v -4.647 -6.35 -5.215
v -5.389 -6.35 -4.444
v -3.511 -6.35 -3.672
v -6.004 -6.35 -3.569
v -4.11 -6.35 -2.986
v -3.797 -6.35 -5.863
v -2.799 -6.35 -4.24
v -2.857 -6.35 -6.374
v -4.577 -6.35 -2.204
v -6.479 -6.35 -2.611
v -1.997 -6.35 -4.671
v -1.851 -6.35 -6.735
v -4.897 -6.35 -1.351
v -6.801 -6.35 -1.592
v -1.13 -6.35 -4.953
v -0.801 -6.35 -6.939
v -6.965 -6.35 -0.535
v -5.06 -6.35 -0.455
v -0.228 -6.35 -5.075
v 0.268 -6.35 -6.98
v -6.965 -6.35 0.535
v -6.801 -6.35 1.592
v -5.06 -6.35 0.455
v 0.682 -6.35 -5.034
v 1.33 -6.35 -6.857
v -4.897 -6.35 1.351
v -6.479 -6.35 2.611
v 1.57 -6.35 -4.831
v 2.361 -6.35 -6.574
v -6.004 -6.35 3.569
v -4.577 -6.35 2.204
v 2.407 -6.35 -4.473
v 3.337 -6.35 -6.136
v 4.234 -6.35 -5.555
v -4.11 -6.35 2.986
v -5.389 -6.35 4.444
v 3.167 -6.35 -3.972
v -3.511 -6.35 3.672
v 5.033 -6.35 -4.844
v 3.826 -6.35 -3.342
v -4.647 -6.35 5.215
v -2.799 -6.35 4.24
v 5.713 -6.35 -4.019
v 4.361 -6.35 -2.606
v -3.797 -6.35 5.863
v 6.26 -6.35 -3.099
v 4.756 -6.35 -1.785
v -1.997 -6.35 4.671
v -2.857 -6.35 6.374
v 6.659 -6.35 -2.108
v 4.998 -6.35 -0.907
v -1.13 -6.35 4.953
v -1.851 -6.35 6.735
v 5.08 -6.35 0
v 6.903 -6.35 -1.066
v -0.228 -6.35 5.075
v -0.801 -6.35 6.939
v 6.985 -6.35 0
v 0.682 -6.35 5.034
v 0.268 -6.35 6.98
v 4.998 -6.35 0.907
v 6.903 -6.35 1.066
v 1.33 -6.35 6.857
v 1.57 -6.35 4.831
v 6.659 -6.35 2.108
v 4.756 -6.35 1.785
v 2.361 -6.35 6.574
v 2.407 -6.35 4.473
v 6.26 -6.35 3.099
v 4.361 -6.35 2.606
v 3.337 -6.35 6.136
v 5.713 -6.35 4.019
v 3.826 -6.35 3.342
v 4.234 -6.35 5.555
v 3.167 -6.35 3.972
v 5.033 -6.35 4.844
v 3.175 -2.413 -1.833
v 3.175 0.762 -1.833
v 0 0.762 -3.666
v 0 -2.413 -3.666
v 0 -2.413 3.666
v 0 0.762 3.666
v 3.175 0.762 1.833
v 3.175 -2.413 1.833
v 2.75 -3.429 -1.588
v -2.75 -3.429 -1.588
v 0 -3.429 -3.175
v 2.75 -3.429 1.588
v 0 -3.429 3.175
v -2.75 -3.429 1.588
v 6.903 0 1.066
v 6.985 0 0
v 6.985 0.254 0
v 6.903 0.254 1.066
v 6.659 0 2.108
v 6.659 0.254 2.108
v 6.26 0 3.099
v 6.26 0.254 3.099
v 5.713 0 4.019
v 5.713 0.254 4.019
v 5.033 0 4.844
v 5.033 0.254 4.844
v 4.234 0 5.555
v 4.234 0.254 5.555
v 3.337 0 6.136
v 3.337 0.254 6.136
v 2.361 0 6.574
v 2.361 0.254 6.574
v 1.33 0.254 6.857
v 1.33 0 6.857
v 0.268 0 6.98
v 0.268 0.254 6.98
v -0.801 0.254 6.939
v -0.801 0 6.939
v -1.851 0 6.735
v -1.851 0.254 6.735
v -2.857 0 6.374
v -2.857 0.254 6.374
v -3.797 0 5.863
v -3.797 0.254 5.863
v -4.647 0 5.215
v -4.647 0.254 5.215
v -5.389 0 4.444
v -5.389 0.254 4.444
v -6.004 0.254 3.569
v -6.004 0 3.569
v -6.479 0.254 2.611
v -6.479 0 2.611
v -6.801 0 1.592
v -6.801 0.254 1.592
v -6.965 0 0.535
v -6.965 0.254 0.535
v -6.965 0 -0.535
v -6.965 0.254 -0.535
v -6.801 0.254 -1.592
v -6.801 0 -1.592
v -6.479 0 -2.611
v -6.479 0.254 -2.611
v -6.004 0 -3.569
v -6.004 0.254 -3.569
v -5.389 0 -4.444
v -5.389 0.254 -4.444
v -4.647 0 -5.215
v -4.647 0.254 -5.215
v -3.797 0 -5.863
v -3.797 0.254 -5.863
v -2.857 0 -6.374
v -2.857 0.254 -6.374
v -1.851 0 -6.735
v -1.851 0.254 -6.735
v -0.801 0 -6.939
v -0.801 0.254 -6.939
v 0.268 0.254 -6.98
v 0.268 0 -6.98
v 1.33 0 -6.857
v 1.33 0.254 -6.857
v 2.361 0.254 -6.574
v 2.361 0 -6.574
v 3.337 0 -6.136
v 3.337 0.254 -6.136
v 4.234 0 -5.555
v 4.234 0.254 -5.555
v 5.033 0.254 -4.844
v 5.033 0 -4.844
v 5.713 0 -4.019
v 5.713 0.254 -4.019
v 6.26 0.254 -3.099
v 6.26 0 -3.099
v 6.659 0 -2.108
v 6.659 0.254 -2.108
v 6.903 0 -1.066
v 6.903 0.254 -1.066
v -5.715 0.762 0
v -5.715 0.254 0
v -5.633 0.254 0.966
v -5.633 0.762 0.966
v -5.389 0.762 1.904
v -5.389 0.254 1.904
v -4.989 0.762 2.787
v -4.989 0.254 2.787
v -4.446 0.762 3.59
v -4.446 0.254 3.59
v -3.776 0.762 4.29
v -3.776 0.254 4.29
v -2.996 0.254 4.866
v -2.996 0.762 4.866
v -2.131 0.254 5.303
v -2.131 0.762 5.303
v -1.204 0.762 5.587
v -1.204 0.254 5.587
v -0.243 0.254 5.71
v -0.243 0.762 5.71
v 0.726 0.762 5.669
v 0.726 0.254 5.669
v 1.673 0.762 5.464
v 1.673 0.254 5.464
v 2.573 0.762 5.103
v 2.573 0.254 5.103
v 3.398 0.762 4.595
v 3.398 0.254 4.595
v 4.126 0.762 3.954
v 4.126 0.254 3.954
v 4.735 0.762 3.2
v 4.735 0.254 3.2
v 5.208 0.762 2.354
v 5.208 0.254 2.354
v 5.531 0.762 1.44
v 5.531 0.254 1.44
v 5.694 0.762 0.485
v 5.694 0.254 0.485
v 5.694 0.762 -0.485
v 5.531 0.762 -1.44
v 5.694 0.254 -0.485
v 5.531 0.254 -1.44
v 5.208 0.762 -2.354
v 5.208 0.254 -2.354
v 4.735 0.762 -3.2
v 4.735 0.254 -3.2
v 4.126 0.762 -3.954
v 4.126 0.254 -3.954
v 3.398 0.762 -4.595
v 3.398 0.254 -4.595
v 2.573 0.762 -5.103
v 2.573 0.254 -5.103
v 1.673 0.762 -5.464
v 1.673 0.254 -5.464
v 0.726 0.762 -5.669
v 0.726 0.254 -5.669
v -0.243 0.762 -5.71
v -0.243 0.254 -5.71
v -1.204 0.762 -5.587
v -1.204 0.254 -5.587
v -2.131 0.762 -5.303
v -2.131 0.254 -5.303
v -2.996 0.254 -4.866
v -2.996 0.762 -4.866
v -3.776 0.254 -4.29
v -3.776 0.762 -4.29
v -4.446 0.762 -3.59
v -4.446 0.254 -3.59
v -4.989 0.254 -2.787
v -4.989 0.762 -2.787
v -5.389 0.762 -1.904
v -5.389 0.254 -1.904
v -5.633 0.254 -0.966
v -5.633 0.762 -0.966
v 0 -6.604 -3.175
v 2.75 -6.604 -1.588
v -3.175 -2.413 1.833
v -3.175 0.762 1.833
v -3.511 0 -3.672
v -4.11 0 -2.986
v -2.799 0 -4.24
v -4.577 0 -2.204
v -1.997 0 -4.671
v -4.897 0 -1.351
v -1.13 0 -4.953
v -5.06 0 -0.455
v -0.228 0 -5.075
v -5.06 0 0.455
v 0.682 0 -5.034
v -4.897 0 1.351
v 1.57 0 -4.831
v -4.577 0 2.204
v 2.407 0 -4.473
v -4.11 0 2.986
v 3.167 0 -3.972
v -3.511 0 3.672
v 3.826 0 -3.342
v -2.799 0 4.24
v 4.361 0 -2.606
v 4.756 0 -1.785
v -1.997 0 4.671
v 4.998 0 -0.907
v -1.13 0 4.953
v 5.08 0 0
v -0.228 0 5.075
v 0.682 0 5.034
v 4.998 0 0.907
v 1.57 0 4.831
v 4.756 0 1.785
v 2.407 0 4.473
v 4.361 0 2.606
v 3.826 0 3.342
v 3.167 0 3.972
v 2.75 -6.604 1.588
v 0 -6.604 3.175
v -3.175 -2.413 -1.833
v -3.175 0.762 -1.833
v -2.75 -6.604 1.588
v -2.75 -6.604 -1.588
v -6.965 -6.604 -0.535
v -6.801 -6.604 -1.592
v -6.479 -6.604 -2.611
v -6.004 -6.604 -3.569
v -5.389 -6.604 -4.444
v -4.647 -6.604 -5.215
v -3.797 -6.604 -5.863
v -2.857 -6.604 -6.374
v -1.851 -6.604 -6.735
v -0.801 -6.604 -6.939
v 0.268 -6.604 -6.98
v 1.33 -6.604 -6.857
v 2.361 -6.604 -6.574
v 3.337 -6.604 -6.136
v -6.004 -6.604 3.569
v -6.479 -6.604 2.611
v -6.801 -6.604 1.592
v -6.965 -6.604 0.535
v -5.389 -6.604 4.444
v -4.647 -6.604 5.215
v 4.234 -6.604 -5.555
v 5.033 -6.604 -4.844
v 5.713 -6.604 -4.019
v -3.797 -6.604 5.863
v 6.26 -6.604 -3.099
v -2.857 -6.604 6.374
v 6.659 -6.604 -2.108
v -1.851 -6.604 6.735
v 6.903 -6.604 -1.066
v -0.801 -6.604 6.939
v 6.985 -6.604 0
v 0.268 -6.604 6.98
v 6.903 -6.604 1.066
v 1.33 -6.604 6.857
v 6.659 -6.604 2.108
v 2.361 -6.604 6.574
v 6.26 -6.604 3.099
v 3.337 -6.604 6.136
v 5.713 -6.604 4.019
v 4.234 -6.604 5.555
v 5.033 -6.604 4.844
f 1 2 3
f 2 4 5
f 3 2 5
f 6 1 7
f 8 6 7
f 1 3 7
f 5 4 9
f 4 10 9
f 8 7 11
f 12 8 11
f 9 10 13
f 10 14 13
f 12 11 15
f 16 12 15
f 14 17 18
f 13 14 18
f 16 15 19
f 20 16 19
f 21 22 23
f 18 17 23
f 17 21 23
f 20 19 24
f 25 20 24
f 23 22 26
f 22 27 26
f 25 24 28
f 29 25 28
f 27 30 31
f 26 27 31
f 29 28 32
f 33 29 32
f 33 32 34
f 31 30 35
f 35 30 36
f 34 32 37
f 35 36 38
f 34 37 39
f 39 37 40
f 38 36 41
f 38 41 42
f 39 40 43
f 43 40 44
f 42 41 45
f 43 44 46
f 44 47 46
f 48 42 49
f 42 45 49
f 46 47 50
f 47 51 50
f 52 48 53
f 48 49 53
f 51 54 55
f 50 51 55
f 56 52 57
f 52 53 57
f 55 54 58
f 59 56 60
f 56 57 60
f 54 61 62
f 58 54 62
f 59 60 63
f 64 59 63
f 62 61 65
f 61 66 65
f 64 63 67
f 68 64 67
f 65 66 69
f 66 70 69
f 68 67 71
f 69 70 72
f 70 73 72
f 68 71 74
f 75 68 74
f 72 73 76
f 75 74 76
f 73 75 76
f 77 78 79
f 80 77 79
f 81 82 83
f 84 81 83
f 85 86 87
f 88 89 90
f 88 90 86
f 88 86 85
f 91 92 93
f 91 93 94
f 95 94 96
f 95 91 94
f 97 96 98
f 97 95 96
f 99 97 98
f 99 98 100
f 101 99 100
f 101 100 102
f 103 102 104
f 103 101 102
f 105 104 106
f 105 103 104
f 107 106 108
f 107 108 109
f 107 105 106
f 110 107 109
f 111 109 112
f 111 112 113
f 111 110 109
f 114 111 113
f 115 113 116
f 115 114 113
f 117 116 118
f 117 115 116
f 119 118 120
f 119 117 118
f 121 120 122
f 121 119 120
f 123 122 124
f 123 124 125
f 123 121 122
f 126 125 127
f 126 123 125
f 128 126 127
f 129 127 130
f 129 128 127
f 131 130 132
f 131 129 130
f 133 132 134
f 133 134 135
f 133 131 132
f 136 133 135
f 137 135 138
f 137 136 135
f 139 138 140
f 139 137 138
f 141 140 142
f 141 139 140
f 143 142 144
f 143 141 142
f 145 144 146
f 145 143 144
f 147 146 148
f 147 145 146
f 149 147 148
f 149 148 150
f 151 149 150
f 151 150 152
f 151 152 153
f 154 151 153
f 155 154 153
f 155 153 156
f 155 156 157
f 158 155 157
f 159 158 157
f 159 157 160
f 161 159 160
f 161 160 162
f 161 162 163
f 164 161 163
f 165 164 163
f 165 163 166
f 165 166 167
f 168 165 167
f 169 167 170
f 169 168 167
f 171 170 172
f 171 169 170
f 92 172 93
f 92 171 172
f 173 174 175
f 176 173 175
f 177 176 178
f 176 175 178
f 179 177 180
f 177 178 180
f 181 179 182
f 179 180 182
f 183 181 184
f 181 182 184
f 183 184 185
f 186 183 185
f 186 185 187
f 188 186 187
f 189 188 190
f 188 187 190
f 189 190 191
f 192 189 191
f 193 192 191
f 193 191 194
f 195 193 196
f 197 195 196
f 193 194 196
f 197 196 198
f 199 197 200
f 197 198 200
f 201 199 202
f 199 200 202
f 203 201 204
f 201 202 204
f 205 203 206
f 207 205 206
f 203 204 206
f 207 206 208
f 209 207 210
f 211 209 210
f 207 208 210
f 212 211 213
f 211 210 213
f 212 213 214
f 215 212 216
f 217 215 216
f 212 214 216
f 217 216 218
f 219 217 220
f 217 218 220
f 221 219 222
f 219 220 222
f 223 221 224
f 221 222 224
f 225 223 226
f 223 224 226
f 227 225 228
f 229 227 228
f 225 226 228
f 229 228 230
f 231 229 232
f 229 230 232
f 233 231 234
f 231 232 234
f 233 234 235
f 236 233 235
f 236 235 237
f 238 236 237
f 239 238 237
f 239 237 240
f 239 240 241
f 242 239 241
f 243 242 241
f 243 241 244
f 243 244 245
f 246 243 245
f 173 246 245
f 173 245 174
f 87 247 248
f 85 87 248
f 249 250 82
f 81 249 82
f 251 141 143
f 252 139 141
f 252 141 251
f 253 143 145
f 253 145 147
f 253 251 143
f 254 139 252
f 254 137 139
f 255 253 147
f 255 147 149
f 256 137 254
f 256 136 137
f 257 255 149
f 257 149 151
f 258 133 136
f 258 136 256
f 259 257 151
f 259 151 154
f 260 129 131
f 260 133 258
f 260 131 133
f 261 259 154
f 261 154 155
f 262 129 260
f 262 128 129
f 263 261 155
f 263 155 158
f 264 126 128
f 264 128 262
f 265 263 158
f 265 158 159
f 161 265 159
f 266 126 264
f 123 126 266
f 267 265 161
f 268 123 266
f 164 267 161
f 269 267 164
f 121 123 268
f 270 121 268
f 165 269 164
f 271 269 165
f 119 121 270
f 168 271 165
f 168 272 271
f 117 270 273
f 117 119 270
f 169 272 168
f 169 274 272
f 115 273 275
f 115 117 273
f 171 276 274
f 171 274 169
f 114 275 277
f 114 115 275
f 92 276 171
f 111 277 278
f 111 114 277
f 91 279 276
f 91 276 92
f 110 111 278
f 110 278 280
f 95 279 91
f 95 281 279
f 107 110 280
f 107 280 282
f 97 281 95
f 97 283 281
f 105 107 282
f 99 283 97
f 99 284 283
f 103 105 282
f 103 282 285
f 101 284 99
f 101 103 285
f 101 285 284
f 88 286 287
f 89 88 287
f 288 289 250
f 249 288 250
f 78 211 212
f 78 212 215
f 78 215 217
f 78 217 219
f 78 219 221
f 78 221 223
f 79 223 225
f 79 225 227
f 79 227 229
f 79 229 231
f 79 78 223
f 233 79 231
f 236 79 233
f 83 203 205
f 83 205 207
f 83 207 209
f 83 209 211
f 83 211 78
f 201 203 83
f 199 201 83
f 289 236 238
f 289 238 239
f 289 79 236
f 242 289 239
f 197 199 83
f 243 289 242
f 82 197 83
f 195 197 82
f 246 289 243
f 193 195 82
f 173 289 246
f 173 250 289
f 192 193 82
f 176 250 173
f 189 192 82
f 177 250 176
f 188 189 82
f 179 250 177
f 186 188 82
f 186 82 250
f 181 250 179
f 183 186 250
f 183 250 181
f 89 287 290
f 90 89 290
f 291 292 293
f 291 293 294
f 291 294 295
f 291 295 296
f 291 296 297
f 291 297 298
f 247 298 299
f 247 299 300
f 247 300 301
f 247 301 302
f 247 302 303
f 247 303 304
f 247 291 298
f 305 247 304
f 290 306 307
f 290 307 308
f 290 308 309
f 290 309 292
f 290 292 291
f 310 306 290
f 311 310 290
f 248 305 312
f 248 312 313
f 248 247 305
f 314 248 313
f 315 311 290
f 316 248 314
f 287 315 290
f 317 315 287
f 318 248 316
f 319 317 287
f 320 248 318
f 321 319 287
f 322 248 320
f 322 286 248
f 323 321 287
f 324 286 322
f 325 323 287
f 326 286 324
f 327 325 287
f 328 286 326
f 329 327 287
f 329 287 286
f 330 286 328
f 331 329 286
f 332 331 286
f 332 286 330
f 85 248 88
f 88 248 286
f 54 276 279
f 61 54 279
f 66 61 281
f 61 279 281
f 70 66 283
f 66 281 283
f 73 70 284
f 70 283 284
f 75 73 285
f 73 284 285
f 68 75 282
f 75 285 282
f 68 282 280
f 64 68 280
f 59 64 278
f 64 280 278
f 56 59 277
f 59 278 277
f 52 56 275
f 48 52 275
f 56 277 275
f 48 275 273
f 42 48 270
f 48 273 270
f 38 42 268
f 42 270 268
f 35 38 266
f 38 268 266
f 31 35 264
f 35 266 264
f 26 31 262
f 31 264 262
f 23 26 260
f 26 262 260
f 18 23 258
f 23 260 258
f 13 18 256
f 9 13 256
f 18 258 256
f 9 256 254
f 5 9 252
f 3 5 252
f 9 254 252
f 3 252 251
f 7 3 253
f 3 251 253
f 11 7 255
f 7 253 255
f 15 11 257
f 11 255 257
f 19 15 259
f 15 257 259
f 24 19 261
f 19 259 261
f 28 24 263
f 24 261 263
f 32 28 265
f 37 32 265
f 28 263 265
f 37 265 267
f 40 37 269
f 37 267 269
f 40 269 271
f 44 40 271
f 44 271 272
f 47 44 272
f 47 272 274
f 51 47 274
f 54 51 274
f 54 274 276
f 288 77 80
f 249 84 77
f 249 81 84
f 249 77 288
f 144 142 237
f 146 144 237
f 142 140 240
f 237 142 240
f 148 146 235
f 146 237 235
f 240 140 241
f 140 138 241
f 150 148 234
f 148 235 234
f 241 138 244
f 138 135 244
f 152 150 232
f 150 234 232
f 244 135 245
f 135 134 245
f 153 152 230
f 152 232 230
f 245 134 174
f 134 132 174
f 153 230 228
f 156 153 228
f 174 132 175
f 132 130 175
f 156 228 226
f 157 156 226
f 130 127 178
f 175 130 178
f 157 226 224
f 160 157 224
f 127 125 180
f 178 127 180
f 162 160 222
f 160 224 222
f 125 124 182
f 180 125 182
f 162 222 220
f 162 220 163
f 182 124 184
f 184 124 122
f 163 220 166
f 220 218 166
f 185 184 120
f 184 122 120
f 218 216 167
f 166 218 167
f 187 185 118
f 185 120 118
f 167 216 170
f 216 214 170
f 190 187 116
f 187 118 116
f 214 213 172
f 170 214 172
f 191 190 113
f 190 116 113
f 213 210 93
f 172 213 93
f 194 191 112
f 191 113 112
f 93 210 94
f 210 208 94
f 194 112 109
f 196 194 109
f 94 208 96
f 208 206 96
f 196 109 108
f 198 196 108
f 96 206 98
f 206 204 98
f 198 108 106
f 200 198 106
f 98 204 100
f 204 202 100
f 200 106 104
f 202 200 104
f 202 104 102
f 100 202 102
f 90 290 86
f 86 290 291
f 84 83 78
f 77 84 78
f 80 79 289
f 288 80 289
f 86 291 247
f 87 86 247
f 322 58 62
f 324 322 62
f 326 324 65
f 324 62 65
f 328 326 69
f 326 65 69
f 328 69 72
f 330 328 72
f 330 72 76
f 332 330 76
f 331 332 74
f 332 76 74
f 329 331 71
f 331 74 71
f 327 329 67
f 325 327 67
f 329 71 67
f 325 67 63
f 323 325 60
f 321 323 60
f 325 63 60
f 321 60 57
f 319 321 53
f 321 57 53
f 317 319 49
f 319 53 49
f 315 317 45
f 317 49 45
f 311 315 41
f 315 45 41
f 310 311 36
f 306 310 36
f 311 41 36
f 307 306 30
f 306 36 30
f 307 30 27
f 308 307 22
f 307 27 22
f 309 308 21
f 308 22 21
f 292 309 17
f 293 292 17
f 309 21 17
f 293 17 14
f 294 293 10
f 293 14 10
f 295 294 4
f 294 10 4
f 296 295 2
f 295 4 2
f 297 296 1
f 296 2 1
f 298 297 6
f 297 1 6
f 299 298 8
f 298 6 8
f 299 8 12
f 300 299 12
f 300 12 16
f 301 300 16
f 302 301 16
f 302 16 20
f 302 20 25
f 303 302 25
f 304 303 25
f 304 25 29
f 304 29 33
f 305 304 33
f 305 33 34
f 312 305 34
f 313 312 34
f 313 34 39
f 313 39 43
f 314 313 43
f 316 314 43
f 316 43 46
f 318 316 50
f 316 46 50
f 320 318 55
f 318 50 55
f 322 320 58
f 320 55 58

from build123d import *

# Parameters (mm, degrees)
F0_R      = 5.08
F1_DEPTH  = 6.35
F2_R      = 6.985
F3_DEPTH  = 0.254
F4_R      = 6.985
F5_DEPTH  = 0.254
F7_DEPTH  = 3.175
F8_R      = 5.715
F9_DEPTH  = 0.508
F11_DEPTH = 3.175


with BuildPart() as f1:
    # F0 (on Front) → F1 (new body)
    with BuildSketch(Plane.XZ):
        Circle(F0_R)
    extrude(amount=F1_DEPTH)

    # F2 (on face) → F3 (join)
    with BuildSketch(Plane.XZ.offset(6.35)):
        Circle(F2_R)
    extrude(amount=F3_DEPTH)

    # F4 (on Front) → F5 (join)
    with BuildSketch(Plane.XZ):
        Circle(F4_R)
    extrude(amount=-F5_DEPTH)

    # F6 (on face) → F7 (cut)
    with BuildSketch(Plane.XZ.offset(6.604)):
        Polygon((0, 3.175), (-2.749630657, 1.5875), (-2.749630657, -1.5875), (0, -3.175), (2.749630657, -1.5875), (2.749630657, 1.5875), align=None)
    extrude(amount=-F7_DEPTH, mode=Mode.SUBTRACT)

    # F8 (on face) → F9 (join)
    with BuildSketch(Plane(origin=(0, 0.254, 0), x_dir=(-1, 0, 0), z_dir=(0, 1, 0))):
        Circle(F8_R)
    extrude(amount=F9_DEPTH)

    # F10 (on face) → F11 (cut)
    with BuildSketch(Plane(origin=(0, 0.762, 0), x_dir=(-1, 0, 0), z_dir=(0, 1, 0))):
        Polygon((-3.175, 1.8330871047), (-3.175, -1.8330871047), (0, -3.6661742094), (3.175, -1.8330871047), (3.175, 1.8330871047), (0, 3.6661742094), align=None)
    extrude(amount=-F11_DEPTH, mode=Mode.SUBTRACT)


solid = f1.part
